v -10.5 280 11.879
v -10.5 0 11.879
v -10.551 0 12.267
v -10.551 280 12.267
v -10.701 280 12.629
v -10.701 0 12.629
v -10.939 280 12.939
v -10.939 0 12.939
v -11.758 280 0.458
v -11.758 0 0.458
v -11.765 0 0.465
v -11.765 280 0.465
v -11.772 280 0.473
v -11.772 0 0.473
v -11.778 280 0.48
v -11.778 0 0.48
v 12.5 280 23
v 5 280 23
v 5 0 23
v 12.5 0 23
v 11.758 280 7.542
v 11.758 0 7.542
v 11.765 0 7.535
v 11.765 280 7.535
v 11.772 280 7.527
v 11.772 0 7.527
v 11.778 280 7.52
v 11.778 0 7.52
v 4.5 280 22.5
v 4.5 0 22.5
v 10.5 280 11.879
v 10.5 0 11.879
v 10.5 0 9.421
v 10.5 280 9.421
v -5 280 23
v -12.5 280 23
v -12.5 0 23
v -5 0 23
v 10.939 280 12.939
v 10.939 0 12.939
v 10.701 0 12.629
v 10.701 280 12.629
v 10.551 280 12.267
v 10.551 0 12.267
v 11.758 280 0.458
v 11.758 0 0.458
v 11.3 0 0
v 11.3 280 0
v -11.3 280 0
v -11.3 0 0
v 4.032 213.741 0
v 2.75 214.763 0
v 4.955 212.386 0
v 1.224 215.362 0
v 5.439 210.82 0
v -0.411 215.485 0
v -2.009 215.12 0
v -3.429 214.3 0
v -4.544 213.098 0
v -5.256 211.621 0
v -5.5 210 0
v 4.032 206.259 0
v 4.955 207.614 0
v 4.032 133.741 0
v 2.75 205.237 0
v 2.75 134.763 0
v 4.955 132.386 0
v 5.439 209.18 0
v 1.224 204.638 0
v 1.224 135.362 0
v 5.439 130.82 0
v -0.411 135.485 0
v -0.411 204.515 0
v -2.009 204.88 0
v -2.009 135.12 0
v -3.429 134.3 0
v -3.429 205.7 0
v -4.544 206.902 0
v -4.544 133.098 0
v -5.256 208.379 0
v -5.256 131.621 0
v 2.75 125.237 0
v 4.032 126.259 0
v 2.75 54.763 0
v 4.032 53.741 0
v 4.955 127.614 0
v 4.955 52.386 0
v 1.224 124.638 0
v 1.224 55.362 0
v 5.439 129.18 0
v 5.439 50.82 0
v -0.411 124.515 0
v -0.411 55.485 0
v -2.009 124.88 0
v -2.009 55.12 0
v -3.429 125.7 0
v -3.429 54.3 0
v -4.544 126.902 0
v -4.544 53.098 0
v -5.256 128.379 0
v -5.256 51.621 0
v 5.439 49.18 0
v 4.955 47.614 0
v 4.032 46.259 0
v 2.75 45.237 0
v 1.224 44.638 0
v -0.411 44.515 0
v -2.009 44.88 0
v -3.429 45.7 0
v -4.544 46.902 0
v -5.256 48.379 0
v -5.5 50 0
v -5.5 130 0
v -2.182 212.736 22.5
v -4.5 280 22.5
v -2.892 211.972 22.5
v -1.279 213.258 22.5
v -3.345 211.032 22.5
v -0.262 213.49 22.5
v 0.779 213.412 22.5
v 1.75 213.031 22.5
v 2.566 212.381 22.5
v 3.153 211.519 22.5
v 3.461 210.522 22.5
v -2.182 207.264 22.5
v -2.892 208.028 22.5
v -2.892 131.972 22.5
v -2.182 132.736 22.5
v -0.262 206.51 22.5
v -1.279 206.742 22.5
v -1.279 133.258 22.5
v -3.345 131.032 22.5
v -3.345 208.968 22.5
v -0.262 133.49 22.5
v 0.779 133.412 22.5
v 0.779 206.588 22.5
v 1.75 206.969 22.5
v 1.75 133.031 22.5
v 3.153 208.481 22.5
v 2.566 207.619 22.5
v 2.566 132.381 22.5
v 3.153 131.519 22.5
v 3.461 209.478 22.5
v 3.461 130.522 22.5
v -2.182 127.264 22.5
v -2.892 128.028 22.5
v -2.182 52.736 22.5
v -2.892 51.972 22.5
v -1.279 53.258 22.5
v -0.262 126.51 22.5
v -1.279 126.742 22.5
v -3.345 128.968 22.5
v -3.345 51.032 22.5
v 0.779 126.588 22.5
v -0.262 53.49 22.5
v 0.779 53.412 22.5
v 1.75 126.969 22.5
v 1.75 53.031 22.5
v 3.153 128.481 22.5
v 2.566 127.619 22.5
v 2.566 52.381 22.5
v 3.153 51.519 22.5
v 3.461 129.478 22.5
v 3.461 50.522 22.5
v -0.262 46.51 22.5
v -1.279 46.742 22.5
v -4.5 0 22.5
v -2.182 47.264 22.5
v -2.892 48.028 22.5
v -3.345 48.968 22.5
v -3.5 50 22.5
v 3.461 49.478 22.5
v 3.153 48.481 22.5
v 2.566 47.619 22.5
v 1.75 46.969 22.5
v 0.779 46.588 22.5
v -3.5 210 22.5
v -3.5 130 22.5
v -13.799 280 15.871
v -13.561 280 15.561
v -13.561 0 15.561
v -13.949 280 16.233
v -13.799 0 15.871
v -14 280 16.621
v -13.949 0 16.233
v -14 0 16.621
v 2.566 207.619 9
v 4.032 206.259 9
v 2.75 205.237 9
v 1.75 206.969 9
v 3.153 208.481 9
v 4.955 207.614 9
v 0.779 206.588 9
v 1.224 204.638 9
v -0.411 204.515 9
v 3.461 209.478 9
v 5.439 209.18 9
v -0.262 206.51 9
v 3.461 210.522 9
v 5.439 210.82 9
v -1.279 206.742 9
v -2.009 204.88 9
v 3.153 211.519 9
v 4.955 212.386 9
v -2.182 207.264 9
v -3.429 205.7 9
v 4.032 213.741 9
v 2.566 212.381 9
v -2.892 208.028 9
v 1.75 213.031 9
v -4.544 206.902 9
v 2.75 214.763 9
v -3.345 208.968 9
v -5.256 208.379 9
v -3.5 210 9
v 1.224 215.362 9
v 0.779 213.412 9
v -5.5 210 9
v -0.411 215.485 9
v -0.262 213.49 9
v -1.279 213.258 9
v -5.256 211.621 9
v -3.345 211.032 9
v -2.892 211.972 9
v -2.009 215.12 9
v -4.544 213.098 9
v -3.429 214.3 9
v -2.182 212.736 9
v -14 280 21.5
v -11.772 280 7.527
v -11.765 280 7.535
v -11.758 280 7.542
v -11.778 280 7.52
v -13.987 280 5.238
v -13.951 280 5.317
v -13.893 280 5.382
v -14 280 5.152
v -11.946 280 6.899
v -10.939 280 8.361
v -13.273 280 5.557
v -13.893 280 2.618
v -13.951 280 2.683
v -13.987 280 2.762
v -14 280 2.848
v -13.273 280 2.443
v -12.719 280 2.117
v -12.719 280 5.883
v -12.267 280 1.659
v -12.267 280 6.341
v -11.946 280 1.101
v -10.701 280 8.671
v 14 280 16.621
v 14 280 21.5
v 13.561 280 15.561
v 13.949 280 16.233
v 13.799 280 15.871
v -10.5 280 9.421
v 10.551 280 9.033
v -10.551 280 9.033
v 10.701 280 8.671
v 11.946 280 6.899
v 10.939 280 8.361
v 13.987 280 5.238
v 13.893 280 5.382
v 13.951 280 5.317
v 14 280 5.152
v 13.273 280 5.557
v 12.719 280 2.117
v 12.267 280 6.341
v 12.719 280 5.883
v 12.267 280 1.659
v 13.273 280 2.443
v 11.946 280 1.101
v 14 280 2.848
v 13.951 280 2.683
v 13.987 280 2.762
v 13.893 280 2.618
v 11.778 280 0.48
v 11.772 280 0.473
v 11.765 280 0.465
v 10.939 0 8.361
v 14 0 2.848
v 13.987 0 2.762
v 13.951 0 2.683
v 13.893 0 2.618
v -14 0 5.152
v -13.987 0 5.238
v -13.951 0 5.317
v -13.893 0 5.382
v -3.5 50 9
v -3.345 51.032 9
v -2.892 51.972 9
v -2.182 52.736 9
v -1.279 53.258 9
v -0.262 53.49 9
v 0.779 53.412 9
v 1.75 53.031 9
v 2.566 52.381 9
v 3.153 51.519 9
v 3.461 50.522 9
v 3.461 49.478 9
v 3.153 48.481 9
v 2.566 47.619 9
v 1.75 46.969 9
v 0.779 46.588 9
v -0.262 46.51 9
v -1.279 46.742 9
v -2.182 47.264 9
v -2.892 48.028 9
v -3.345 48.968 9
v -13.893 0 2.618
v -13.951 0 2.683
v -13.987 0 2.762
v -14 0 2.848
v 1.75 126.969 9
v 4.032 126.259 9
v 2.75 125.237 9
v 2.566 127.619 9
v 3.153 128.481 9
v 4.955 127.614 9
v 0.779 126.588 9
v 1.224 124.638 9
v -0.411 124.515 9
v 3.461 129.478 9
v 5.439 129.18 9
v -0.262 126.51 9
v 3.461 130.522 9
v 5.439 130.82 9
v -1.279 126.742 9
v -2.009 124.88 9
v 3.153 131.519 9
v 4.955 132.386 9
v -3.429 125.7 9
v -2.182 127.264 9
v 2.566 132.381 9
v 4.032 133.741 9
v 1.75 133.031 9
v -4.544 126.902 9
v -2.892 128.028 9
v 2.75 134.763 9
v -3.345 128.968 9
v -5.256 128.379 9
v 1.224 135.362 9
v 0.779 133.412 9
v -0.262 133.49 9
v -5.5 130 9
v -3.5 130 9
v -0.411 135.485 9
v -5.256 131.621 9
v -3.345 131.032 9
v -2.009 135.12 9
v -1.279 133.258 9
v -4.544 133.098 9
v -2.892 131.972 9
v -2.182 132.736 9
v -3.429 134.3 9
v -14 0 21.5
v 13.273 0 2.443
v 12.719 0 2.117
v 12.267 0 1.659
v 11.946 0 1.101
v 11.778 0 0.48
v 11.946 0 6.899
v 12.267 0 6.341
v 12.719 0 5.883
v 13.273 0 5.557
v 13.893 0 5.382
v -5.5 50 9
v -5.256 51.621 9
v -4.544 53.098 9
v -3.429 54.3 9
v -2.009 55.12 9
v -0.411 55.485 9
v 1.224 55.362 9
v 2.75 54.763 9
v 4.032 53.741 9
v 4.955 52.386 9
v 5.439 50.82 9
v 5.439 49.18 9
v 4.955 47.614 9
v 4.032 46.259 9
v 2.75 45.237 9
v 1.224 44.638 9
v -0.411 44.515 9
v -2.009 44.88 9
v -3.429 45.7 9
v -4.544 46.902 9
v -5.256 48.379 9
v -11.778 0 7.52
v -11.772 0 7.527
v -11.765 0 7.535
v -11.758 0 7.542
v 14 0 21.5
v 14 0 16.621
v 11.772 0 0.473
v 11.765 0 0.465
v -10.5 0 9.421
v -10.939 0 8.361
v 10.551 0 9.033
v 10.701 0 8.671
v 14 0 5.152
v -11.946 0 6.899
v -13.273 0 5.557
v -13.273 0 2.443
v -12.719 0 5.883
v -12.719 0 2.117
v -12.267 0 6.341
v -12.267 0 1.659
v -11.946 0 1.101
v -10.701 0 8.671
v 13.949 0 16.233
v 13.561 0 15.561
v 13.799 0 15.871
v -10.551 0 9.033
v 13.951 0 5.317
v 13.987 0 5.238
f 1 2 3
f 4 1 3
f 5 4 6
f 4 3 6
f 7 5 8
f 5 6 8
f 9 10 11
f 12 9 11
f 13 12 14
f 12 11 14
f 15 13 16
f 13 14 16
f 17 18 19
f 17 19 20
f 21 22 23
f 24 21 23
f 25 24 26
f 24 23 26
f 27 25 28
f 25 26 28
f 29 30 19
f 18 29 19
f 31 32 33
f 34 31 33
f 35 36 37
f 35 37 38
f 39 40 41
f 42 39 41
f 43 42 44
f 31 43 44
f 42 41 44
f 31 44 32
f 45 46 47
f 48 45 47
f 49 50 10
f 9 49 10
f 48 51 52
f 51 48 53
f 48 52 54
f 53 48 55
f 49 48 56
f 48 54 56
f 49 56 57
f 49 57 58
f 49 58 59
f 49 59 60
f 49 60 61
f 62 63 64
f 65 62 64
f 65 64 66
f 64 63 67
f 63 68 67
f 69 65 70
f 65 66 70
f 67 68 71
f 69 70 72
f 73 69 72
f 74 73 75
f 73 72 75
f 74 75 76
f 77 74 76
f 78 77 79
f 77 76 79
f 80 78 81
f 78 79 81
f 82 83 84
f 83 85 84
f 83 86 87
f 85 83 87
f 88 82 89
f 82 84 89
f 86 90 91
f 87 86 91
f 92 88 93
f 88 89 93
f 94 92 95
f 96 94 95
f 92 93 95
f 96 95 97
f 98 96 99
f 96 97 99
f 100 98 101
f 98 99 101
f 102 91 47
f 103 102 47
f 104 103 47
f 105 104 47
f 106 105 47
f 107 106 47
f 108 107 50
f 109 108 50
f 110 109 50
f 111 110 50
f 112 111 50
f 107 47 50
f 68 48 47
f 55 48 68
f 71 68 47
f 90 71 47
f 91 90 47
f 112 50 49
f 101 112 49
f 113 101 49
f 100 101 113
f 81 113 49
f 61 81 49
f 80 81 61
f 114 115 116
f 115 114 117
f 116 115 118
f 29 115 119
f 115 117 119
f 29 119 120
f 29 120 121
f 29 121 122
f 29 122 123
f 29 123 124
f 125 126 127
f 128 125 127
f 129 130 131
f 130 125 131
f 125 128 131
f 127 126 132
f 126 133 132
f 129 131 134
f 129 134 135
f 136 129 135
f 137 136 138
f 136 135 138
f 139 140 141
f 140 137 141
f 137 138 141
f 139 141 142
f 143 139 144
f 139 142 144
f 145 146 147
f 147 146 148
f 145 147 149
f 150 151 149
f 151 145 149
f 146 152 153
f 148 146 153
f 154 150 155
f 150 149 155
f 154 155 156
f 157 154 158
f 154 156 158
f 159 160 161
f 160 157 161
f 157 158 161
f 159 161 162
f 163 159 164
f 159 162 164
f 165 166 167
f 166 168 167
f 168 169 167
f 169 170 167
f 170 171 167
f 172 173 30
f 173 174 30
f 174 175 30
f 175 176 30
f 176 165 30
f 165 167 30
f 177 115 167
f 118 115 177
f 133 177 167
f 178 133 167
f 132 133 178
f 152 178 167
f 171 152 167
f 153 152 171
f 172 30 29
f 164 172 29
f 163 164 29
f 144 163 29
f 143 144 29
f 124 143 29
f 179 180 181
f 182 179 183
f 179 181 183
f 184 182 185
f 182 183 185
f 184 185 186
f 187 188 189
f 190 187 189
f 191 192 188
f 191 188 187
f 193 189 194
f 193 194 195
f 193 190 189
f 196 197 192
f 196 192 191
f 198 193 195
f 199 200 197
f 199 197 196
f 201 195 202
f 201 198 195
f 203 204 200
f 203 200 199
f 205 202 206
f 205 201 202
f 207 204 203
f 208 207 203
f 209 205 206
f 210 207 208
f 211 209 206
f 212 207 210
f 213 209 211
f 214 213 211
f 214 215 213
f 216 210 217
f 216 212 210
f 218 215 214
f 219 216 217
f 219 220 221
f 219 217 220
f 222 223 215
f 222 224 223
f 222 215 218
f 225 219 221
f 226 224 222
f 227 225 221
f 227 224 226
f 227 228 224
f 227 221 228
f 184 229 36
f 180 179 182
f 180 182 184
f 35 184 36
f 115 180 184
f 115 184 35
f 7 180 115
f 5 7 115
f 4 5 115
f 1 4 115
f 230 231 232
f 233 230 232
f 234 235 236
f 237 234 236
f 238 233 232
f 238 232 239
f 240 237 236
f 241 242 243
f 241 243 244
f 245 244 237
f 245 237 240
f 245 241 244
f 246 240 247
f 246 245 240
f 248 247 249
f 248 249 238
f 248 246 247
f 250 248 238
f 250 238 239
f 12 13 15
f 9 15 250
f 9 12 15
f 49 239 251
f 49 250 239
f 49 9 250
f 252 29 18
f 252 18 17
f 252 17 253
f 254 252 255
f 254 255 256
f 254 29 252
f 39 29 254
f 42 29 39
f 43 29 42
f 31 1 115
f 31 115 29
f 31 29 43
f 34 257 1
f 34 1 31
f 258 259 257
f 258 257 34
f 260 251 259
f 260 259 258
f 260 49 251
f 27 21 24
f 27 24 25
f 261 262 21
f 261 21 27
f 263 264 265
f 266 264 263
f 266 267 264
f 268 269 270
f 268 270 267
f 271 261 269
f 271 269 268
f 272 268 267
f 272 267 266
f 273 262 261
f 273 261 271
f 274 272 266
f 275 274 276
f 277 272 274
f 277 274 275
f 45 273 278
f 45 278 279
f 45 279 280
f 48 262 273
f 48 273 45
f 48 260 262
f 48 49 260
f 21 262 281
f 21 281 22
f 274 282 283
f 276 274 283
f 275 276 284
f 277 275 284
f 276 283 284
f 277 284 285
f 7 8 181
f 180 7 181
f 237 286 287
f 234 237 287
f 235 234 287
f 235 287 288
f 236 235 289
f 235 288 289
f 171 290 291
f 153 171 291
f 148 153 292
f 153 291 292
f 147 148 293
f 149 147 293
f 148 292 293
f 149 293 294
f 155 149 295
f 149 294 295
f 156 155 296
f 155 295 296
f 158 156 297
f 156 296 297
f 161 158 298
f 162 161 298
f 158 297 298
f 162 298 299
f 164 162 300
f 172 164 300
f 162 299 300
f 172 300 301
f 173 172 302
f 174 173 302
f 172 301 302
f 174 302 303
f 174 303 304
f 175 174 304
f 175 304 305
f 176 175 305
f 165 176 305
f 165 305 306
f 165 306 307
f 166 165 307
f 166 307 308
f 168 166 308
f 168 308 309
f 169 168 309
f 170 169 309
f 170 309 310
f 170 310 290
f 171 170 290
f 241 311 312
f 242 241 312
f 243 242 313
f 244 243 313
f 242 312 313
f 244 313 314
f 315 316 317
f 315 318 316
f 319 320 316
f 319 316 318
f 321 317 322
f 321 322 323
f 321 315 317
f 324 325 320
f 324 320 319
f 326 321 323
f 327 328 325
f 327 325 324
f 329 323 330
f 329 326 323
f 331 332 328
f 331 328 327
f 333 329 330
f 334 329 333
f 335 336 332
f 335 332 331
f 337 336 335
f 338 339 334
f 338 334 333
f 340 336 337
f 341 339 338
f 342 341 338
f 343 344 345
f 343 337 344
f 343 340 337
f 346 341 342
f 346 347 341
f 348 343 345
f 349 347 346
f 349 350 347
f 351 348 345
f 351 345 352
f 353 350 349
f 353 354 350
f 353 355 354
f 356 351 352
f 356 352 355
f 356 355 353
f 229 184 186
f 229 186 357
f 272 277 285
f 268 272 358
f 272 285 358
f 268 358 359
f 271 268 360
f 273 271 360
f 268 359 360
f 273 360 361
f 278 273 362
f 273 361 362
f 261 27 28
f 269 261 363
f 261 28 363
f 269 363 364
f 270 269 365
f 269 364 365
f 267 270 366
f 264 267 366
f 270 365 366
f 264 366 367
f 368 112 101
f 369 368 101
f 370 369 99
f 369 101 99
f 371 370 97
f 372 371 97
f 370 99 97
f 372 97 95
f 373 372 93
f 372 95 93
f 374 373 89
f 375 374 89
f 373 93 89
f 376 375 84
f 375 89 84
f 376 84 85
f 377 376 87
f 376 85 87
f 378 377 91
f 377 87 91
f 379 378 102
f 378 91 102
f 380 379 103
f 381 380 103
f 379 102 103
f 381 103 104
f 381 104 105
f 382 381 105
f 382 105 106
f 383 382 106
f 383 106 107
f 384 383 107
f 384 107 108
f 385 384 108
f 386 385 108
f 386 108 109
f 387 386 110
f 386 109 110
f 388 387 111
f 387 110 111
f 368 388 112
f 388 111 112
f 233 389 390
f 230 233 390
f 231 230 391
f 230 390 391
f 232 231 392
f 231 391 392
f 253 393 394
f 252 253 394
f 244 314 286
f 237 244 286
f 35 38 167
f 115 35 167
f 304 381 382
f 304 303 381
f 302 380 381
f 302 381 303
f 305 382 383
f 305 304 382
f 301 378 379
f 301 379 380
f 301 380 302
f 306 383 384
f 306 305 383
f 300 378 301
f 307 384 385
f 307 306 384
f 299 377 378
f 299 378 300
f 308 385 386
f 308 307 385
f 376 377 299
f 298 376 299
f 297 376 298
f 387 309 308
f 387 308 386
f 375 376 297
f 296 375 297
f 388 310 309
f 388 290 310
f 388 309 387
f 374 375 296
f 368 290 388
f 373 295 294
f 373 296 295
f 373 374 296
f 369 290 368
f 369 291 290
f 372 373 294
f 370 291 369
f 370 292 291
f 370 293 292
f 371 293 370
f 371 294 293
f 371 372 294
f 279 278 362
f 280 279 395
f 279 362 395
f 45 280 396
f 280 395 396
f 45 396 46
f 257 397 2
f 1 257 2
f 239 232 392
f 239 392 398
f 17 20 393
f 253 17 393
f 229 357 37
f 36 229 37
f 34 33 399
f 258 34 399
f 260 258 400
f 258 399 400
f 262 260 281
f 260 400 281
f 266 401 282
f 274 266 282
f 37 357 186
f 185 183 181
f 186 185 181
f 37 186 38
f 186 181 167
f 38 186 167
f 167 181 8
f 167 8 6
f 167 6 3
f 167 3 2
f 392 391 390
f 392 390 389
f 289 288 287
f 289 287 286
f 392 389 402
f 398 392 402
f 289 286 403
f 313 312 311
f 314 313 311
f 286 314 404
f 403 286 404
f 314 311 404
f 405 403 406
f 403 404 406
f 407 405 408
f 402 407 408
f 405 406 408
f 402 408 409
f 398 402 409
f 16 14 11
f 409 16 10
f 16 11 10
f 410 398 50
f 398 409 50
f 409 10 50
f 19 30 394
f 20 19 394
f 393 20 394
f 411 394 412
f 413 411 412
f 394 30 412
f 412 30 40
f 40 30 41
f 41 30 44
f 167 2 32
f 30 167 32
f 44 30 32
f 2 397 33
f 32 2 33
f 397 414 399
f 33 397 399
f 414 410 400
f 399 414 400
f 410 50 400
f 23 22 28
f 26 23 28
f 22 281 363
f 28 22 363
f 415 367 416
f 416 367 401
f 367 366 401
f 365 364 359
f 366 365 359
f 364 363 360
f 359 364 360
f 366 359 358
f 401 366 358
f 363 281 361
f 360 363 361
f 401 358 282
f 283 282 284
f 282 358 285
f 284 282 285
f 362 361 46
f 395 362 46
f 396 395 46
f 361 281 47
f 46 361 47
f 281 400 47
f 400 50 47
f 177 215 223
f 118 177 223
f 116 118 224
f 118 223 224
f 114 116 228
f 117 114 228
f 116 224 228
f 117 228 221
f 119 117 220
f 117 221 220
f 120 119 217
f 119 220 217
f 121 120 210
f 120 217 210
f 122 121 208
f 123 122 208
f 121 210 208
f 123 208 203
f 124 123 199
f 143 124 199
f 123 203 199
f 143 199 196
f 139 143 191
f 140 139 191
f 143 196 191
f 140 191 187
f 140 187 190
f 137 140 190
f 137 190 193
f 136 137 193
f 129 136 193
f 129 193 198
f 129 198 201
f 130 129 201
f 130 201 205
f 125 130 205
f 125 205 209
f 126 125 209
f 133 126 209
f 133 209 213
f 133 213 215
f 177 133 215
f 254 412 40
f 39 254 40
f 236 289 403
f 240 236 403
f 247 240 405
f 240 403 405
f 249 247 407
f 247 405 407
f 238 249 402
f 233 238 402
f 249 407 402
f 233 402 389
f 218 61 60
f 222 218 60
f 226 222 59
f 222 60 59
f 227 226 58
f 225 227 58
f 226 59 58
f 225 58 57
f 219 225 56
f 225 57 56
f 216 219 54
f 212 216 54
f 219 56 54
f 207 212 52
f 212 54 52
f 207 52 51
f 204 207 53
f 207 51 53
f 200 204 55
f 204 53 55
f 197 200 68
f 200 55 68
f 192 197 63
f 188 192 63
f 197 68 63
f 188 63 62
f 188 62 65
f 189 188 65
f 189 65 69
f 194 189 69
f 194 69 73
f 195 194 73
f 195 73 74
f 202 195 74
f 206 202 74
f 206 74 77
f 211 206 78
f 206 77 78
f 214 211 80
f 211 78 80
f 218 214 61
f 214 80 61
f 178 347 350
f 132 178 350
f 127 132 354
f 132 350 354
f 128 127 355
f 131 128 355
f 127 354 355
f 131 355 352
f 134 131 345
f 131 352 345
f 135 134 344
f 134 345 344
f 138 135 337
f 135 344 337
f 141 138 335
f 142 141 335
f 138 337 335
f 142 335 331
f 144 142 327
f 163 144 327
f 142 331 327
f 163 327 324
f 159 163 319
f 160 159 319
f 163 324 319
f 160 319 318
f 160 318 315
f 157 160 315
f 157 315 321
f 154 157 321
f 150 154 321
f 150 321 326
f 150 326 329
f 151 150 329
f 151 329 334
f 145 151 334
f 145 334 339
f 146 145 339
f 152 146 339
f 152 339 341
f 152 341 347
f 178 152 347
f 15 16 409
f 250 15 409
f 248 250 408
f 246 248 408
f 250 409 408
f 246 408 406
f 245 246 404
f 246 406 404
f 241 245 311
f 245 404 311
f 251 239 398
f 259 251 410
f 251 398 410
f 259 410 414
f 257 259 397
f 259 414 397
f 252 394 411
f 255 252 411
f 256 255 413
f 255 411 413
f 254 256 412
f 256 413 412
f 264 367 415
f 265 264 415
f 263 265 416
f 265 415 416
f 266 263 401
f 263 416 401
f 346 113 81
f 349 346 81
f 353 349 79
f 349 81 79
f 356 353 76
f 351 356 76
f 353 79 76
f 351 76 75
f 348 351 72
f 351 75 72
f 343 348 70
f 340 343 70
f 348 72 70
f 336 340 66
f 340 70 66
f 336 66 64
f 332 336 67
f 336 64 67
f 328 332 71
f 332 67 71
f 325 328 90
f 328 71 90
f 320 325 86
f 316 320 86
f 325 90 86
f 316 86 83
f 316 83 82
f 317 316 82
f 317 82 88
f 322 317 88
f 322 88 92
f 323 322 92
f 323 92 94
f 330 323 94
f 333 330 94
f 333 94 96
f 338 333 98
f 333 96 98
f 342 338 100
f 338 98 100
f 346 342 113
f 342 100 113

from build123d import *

# Parameters (mm, degrees)
EXTRUDE_1_DEPTH        = 280
SKETCH_2_R             = 5.5
CUT_EXTRUDE_1_DEPTH    = 9
SKETCH_3_R             = 3.5
CUT_EXTRUDE_2_DEPTH    = 281.699127181
PATTERN_LINEAR_1_COUNT = 4
PATTERN_LINEAR_1_PITCH = 80


with BuildPart() as part:
    # 草图1 → 凸台-拉伸1 (new body)
    with BuildSketch(Plane(origin=(0, 0, 0), x_dir=(1, 0, 0), z_dir=(0, 1, 0))):
        with BuildLine():
            Line((11.758193654, -0.458193653), (11.300000001, 0))
            Line((11.300000001, 0), (-11.299999999, 0))
            Line((-11.299999999, 0), (-11.758193652, -0.458193653))
            ThreePointArc((-11.758193652, -0.458193653), (-11.768448168, -0.468969729), (-11.778155913, -0.480240869))
            ThreePointArc((-11.778155913, -0.480240869), (-12.478076595, -1.902541611), (-13.892618036, -2.618014092))
            ThreePointArc((-13.892618036, -2.618014092), (-13.971832127, -2.721095863), (-13.999999999, -2.848010379))
            Line((-13.999999999, -2.848010379), (-13.999999999, -5.15198962))
            ThreePointArc((-13.999999999, -5.15198962), (-13.971832127, -5.278904137), (-13.892618036, -5.381985907))
            ThreePointArc((-13.892618036, -5.381985907), (-12.478076595, -6.097458389), (-11.778155913, -7.519759131))
            ThreePointArc((-11.778155913, -7.519759131), (-11.768448168, -7.531030271), (-11.758193652, -7.541806347))
            Line((-11.758193652, -7.541806347), (-10.939339827, -8.360660172))
            ThreePointArc((-10.939339827, -8.360660172), (-10.614191318, -8.847269563), (-10.5, -9.421264856))
            Line((-10.5, -9.421264856), (-10.5, -11.878679656))
            ThreePointArc((-10.5, -11.878679656), (-10.614180701, -12.452704805), (-10.939339828, -12.939339828))
            Line((-10.939339828, -12.939339828), (-13.560660172, -15.560660172))
            ThreePointArc((-13.560660172, -15.560660172), (-13.88581399, -16.047282379), (-14, -16.6212926))
            Line((-14, -16.6212926), (-14, -21.5))
            Line((-14, -21.5), (-12.5, -23))
            Line((-12.5, -23), (-5, -23))
            Line((-5, -23), (-4.5, -22.5))
            Line((-4.5, -22.5), (4.5, -22.5))
            Line((4.5, -22.5), (5, -23))
            Line((5, -23), (12.5, -23))
            Line((12.5, -23), (14, -21.5))
            Line((14, -21.5), (14, -16.621320344))
            ThreePointArc((14, -16.621320344), (13.885819299, -16.047295195), (13.560660172, -15.560660172))
            Line((13.560660172, -15.560660172), (10.939339828, -12.939339828))
            ThreePointArc((10.939339828, -12.939339828), (10.61418601, -12.452717621), (10.5, -11.8787074))
            Line((10.5, -11.8787074), (10.5, -9.421320344))
            ThreePointArc((10.5, -9.421320344), (10.614180701, -8.847295195), (10.939339828, -8.360660172))
            Line((10.939339828, -8.360660172), (11.758193653, -7.541806347))
            ThreePointArc((11.758193653, -7.541806347), (11.768448169, -7.531030271), (11.778155914, -7.519759131))
            ThreePointArc((11.778155914, -7.519759131), (12.478076596, -6.097458389), (13.892618037, -5.381985908))
            ThreePointArc((13.892618037, -5.381985908), (13.971832128, -5.278904137), (14, -5.15198962))
            Line((14, -5.15198962), (14, -2.848010379))
            ThreePointArc((14, -2.848010379), (13.971832128, -2.721095863), (13.892618037, -2.618014092))
            ThreePointArc((13.892618037, -2.618014092), (12.478076596, -1.902541611), (11.778155915, -0.480240869))
            ThreePointArc((11.778155915, -0.480240869), (11.76844817, -0.468969728), (11.758193654, -0.458193653))
        make_face()
    extrude(amount=EXTRUDE_1_DEPTH)

    # 草图2 → 切除-拉伸1 (cut)
    with BuildSketch(Plane(origin=(0, 0, 0), x_dir=(-1, 0, 0), z_dir=(0, 0, -1))):
        with Locations((0, 50)):
            Circle(SKETCH_2_R)
    cut_extrude_1 = extrude(amount=-CUT_EXTRUDE_1_DEPTH, mode=Mode.SUBTRACT)

    # 草图3 → 切除-拉伸2 (cut, through all)
    with BuildSketch(Plane(origin=(0, 0, 9), x_dir=(-1, 0, 0), z_dir=(0, 0, -1))):
        with Locations((0, 50)):
            Circle(SKETCH_3_R)
    cut_extrude_2 = extrude(amount=-CUT_EXTRUDE_2_DEPTH, mode=Mode.SUBTRACT)

    # 阵列(线性)1: 切除-拉伸1, 切除-拉伸2 ×4
    with Locations(*[(0, i * PATTERN_LINEAR_1_PITCH, 0) for i in range(1, PATTERN_LINEAR_1_COUNT)]):
        add(cut_extrude_1, mode=Mode.SUBTRACT)
        add(cut_extrude_2, mode=Mode.SUBTRACT)


solid = part.part
